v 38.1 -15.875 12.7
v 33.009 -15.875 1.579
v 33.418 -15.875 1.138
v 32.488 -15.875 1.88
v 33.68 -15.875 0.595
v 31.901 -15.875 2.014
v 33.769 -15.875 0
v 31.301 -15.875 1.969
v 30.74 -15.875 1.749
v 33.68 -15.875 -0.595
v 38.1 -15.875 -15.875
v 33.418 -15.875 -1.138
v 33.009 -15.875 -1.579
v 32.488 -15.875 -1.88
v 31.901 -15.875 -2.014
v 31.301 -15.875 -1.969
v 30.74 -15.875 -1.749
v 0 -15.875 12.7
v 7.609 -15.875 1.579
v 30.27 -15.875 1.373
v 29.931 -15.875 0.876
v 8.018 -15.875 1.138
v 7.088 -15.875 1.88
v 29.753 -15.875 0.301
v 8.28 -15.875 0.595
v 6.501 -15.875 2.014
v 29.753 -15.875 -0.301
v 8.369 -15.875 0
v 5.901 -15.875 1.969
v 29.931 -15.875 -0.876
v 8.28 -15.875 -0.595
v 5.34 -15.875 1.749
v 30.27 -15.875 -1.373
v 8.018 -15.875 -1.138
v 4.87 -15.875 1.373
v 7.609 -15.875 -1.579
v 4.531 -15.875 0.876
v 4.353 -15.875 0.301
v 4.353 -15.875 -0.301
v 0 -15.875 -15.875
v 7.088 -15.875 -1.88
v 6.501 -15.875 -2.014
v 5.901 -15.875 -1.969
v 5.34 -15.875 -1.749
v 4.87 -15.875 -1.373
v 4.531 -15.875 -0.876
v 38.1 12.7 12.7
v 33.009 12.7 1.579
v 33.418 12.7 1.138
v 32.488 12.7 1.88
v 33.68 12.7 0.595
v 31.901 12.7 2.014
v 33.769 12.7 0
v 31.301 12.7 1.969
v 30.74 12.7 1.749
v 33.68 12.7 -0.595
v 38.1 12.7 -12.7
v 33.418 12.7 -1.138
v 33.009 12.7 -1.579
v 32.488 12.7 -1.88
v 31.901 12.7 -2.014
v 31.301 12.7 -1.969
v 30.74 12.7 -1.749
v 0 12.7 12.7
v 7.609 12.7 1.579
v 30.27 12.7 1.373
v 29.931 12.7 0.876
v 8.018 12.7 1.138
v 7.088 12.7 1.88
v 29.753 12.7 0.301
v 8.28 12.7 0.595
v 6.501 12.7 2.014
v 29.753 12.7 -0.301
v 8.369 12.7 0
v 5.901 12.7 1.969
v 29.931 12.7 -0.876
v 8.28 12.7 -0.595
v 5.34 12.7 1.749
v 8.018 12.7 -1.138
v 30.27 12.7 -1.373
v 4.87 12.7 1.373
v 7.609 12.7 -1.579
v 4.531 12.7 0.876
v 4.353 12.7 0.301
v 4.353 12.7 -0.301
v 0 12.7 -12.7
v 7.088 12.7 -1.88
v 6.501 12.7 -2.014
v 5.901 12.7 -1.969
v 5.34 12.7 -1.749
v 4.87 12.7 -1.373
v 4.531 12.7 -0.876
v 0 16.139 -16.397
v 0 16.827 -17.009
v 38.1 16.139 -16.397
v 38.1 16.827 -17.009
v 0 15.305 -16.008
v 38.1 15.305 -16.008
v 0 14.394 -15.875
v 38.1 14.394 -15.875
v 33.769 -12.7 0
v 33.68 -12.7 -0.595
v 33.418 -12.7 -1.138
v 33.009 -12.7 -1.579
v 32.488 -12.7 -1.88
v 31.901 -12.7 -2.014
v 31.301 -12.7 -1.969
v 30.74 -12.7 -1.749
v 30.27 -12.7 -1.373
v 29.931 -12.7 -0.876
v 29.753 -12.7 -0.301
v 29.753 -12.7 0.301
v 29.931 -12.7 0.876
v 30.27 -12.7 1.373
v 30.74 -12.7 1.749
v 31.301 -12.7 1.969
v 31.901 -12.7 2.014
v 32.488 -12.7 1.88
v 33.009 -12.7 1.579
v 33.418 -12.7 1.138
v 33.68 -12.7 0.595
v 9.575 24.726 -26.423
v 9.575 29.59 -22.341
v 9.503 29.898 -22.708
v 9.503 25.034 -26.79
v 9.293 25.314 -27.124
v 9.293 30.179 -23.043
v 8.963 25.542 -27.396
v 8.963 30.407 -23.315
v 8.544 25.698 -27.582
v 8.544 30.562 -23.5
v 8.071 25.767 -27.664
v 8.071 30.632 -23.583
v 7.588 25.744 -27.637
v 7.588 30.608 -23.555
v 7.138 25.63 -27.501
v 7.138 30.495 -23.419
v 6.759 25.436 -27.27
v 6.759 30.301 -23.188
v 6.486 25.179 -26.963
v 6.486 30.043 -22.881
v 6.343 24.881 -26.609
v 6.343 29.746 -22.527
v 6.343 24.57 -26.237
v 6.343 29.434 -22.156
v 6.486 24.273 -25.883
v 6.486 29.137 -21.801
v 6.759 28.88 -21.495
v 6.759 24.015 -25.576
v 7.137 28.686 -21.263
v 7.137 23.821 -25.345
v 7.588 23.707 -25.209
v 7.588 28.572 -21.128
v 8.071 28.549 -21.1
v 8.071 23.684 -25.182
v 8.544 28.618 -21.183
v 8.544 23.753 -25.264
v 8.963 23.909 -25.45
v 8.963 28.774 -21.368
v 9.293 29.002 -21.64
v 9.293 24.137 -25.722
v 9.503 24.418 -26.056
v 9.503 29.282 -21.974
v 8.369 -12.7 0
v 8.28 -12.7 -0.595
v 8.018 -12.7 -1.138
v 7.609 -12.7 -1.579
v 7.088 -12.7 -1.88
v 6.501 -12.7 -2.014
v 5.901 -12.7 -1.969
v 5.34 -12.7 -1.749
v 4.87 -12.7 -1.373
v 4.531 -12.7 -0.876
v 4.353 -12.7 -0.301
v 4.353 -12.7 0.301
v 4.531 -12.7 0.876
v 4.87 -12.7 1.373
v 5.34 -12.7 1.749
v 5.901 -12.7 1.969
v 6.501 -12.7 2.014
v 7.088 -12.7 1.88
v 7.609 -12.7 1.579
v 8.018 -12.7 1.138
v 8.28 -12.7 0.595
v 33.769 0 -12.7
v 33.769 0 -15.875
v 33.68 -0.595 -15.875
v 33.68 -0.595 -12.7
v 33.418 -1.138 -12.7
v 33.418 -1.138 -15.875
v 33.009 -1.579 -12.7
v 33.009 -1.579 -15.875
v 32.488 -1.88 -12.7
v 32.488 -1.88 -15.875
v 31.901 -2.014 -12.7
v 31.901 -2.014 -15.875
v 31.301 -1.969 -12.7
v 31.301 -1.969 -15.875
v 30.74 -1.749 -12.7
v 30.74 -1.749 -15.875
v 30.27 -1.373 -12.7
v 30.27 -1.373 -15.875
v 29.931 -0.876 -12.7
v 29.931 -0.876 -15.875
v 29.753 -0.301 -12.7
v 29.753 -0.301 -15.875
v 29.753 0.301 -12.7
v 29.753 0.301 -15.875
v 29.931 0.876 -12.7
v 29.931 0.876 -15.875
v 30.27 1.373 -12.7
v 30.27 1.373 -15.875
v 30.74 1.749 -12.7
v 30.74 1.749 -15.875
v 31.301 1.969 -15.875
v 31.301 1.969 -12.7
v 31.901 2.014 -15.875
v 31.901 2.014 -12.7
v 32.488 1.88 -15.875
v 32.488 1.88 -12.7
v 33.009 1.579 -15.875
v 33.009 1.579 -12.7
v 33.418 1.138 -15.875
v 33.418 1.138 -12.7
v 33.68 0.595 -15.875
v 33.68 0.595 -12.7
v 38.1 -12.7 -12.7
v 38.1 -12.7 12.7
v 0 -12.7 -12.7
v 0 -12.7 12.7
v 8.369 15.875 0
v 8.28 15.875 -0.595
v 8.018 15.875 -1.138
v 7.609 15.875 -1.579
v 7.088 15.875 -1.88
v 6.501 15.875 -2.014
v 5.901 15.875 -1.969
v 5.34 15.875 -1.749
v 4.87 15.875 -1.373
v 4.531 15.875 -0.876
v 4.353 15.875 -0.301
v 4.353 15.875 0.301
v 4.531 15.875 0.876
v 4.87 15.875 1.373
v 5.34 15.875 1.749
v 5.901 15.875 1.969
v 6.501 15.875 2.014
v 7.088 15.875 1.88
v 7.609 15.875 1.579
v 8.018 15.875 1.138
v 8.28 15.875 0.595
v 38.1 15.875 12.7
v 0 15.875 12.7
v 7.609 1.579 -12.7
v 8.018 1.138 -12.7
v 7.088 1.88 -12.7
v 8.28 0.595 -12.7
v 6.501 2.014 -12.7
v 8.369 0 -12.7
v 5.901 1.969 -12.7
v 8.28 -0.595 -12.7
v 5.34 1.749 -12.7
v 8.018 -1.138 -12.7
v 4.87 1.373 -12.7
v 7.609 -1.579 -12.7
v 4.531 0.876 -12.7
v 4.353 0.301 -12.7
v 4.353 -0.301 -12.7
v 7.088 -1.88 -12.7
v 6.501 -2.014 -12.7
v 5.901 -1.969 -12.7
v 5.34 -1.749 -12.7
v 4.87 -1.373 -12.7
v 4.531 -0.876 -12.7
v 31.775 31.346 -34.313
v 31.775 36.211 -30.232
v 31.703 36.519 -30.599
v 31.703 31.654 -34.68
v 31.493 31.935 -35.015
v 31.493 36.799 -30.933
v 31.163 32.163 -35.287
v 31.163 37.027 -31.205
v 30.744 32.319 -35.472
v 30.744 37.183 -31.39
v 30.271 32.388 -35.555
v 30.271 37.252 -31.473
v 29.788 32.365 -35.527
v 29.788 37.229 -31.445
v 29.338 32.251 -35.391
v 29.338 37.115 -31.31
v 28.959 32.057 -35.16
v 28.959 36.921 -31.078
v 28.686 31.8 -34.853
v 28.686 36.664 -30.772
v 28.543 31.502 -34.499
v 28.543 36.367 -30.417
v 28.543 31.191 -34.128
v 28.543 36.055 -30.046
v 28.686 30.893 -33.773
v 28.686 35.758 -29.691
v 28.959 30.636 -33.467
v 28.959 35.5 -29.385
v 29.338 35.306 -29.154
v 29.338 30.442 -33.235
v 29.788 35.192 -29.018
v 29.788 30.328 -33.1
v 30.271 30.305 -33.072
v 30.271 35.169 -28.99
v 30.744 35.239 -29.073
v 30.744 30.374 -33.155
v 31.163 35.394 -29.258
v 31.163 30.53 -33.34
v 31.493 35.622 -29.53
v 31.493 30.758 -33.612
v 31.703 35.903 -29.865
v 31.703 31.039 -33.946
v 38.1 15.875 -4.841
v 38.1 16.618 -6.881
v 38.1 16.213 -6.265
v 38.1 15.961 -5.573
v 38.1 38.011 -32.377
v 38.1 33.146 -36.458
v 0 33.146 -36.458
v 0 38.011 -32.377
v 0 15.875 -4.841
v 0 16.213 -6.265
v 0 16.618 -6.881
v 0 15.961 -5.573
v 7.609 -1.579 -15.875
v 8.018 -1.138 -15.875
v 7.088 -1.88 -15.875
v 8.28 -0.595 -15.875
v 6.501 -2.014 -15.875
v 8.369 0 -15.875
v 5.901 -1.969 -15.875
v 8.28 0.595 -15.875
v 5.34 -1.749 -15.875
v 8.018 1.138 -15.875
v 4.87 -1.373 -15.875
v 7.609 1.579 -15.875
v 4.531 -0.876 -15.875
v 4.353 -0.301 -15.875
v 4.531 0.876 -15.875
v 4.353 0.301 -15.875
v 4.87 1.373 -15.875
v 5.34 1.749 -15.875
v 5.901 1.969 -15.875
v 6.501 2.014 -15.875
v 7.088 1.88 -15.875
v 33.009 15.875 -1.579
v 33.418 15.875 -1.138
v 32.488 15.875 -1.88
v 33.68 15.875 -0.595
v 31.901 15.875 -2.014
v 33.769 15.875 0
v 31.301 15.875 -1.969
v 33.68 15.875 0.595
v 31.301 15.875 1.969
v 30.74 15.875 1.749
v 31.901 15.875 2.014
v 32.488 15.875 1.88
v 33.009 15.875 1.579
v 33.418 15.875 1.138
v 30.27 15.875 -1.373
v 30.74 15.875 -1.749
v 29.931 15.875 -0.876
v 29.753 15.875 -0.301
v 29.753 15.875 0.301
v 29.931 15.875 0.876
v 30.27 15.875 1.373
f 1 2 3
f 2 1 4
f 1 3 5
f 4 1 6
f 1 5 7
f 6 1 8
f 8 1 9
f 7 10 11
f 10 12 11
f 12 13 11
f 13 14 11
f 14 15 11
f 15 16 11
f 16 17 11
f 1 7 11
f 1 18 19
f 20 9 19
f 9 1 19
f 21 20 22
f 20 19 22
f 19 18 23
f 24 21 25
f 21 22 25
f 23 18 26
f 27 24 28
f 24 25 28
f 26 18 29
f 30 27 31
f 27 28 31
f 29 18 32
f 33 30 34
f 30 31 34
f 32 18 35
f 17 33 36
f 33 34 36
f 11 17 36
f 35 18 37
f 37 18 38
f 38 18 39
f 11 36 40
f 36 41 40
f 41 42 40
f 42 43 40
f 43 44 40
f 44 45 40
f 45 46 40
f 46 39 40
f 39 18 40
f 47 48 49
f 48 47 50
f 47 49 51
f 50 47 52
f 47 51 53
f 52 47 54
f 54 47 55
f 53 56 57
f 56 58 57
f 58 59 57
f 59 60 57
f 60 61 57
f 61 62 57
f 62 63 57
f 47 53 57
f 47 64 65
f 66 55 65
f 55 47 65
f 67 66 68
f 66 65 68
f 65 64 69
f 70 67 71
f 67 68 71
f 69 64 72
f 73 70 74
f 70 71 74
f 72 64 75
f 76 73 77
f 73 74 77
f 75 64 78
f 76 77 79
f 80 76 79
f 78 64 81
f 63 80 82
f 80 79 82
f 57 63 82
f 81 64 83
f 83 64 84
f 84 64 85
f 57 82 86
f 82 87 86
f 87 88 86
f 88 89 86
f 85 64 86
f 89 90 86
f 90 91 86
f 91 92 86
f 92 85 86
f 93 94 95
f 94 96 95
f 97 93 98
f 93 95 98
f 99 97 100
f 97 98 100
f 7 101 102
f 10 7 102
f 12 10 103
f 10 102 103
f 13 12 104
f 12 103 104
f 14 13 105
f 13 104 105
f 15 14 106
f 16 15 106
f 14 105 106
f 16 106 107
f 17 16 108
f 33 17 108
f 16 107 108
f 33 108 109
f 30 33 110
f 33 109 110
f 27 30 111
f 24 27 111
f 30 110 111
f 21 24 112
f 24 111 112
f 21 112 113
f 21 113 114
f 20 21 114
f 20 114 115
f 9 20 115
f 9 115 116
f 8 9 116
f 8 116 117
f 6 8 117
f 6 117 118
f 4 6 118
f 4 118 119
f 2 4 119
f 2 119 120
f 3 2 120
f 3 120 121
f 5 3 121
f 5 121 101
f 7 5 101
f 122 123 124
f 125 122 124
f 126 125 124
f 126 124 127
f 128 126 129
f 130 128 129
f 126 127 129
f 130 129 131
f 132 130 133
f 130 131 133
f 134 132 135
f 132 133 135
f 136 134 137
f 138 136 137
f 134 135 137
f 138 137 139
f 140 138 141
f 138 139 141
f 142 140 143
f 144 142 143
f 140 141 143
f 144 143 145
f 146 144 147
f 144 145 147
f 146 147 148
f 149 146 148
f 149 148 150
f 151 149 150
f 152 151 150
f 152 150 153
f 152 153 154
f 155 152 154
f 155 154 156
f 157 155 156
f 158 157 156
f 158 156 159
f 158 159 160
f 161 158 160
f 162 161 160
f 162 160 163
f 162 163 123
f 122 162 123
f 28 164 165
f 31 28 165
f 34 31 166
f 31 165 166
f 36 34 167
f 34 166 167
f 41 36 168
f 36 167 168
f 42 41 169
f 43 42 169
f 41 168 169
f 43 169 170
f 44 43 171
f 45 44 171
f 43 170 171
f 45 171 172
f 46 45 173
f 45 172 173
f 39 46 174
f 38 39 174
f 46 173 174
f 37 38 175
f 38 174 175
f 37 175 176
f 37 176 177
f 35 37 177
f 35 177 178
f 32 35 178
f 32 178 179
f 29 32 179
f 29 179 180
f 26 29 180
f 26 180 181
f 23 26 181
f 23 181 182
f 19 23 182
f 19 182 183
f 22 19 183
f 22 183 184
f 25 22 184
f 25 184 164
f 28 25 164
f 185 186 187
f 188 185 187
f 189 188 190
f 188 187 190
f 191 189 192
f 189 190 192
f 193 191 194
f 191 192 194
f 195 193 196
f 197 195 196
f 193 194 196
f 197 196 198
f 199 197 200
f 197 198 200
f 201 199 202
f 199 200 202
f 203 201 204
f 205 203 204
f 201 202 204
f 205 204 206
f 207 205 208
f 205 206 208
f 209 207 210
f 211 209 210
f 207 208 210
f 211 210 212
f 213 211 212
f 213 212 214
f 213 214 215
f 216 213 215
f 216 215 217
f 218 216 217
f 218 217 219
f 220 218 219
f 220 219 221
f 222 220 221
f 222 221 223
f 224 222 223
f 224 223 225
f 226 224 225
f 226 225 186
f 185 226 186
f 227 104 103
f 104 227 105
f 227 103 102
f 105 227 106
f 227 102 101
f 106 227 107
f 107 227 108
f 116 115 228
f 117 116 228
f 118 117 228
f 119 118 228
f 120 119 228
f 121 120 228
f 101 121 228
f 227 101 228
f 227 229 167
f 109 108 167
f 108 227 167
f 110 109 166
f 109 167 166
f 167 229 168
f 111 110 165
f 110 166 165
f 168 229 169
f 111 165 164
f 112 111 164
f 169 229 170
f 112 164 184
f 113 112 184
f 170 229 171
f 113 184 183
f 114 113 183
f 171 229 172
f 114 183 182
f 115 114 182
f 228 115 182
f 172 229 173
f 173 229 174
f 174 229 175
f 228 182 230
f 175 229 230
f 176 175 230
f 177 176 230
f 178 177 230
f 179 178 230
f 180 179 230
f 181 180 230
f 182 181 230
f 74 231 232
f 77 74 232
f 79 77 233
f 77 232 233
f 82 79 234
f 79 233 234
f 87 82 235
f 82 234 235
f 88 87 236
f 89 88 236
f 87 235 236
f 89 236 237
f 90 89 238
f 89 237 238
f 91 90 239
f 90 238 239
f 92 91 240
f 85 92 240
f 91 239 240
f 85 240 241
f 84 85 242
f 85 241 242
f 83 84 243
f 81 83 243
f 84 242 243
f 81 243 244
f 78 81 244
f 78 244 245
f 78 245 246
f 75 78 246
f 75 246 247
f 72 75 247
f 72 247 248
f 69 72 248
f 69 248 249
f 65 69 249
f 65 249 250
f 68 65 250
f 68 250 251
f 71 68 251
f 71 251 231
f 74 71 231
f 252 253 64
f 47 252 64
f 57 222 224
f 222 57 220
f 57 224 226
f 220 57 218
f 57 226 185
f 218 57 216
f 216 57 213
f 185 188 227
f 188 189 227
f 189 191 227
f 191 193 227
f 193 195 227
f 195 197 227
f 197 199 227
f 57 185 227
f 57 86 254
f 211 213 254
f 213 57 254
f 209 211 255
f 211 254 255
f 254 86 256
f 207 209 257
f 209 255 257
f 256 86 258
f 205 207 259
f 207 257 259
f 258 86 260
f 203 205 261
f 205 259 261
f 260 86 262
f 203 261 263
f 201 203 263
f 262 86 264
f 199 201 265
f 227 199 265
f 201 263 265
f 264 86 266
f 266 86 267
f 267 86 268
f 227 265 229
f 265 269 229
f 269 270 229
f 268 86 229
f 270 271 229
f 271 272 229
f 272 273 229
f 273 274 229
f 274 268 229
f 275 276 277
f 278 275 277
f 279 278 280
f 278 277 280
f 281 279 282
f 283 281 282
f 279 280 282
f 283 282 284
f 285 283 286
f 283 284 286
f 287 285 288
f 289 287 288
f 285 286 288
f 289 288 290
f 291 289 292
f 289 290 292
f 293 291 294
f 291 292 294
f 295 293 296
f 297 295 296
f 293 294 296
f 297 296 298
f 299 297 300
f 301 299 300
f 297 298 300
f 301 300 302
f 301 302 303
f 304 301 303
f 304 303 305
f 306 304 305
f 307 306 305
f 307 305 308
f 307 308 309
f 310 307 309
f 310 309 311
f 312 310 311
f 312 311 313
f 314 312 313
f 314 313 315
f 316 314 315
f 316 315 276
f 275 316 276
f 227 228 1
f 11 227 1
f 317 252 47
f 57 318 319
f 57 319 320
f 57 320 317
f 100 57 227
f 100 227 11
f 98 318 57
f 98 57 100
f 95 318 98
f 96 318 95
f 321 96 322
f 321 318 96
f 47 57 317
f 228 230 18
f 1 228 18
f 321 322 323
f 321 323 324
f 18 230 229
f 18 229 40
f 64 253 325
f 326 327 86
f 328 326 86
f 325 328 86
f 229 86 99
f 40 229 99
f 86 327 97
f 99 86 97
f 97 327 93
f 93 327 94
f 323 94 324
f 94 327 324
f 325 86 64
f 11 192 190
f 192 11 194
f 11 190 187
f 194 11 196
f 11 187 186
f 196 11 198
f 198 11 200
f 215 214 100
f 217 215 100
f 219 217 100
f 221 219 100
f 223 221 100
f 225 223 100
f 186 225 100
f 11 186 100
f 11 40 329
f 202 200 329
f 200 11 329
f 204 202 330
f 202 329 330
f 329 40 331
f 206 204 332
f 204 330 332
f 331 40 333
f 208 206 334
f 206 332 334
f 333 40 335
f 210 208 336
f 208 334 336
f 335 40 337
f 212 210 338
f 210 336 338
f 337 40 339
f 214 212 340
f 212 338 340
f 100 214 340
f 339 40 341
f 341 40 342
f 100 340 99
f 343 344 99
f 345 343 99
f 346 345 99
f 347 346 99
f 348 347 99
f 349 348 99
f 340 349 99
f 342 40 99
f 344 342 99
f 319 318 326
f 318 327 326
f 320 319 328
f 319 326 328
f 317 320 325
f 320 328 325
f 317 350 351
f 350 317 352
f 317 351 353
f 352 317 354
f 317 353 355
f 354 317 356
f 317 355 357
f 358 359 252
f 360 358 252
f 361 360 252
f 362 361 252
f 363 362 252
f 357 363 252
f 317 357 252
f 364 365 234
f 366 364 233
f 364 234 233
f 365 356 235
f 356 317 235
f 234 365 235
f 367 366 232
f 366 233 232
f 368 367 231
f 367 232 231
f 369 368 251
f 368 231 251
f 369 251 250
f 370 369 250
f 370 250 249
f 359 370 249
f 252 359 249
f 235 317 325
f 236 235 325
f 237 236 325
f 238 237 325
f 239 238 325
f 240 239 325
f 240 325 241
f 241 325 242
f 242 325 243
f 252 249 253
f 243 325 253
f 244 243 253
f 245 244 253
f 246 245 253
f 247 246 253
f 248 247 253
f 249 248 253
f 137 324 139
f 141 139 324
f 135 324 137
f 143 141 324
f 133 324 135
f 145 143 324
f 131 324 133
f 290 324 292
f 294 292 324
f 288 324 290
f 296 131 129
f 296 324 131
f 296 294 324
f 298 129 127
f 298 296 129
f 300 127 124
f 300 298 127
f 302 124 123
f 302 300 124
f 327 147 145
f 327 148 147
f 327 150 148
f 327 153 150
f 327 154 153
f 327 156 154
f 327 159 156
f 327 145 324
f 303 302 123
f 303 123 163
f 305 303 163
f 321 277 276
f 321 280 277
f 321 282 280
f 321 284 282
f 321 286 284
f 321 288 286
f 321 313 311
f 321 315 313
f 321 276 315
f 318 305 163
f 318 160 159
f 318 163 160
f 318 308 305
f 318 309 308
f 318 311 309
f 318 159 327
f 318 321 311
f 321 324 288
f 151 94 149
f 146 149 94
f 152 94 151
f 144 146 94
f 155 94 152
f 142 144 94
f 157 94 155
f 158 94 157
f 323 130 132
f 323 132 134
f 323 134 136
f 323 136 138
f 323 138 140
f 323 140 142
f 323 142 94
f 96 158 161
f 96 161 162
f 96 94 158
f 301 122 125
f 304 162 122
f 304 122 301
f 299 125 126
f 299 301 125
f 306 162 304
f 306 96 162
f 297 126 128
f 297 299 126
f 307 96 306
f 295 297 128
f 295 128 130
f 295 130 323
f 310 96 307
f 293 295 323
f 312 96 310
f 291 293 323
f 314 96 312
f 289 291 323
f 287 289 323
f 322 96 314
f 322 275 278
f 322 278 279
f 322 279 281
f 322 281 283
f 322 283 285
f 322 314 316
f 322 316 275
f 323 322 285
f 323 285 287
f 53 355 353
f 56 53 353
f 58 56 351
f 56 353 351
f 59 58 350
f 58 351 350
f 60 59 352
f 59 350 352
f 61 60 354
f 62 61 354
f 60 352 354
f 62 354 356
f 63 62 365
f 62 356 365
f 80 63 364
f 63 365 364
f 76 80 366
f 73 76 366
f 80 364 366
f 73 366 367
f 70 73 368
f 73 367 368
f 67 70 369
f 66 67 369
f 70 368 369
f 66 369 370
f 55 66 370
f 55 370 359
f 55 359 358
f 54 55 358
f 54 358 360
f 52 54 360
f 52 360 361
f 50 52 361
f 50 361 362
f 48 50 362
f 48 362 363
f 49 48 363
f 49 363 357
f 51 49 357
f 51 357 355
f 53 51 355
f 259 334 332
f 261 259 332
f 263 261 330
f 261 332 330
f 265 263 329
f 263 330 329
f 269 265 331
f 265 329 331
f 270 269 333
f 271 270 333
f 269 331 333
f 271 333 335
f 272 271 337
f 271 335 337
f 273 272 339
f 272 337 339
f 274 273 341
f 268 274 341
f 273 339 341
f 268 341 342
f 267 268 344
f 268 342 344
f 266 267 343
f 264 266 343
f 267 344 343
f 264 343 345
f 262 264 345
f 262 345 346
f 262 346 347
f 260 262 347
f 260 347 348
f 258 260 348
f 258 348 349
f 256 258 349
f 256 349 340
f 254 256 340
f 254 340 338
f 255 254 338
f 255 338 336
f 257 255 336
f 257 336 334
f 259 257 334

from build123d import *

# Parameters (mm, degrees)
BOSS_EXTRUDE1_DEPTH = 38.1
SKETCH2_R           = 2.0193
CUT_EXTRUDE1_DEPTH  = 38.862
BOSS_EXTRUDE2_DEPTH = 38.1
FILLET1_R           = 3.175
CIRPATTERN1_COUNT   = 2
CIRPATTERN1_ANGLE   = 90
SKETCH6_R           = 1.625
CUT_EXTRUDE2_DEPTH  = 28.575


with BuildPart() as part:
    # Sketch1 → Boss-Extrude1 (new body)
    with BuildSketch(Plane(origin=(0, 0, 0), x_dir=(0, 0, -1), z_dir=(1, 0, 0))):
        Polygon((-12.7, 12.7), (12.7, 12.7), (12.7, -12.7), (-12.7, -12.7), (-12.7, -15.875), (15.875, -15.875), (15.875, 15.875), (-12.7, 15.875), align=None)
    extrude(amount=BOSS_EXTRUDE1_DEPTH)

    # Sketch2 → Cut-Extrude1 (cut)
    with BuildSketch(Plane(origin=(0, 15.875, 0), x_dir=(1, 0, 0), z_dir=(0, 1, 0))):
        with Locations((6.35, 0)):
            Circle(SKETCH2_R)
        with Locations((31.75, 0)):
            Circle(SKETCH2_R)
    cut_extrude1 = extrude(amount=-CUT_EXTRUDE1_DEPTH, mode=Mode.SUBTRACT)

    # Sketch5 → Boss-Extrude2 (add)
    with BuildSketch(Plane(origin=(38.1, 0, 0), x_dir=(0, 0, -1), z_dir=(1, 0, 0))):
        Polygon((15.875, 15.875), (36.45820813, 33.146238), (32.376524054, 38.010634684), (5.996111961, 15.875), align=None)
    extrude(amount=-BOSS_EXTRUDE2_DEPTH)

    # Fillet1
    fillet1_edges = [part.edges().sort_by_distance(p)[0] for p in [
        (19.05, 15.875, -15.875),
        (19.05, 15.875, -5.996111961),
    ]]
    fillet(fillet1_edges, radius=FILLET1_R)

    # CirPattern1: Cut-Extrude1 ×2 about axis
    cirpattern1_axis = Axis((21.2725, 0, 0), (-1, 0, 0))
    for i in range(1, CIRPATTERN1_COUNT):
        add(cut_extrude1.rotate(cirpattern1_axis, i * CIRPATTERN1_ANGLE / (CIRPATTERN1_COUNT - 1)), mode=Mode.SUBTRACT)

    # Sketch6 → Cut-Extrude2 (cut)
    with BuildSketch(Plane(origin=(0, 6.363382753, 5.339473678), x_dir=(1, 0, 0), z_dir=(0, 0.7660467219358679, 0.6427848938885473))):
        with Locations((7.95, 36.134591901)):
            Circle(SKETCH6_R)
        with Locations((30.15, 46.434591901)):
            Circle(SKETCH6_R)
    extrude(amount=-CUT_EXTRUDE2_DEPTH, mode=Mode.SUBTRACT)


solid = part.part
